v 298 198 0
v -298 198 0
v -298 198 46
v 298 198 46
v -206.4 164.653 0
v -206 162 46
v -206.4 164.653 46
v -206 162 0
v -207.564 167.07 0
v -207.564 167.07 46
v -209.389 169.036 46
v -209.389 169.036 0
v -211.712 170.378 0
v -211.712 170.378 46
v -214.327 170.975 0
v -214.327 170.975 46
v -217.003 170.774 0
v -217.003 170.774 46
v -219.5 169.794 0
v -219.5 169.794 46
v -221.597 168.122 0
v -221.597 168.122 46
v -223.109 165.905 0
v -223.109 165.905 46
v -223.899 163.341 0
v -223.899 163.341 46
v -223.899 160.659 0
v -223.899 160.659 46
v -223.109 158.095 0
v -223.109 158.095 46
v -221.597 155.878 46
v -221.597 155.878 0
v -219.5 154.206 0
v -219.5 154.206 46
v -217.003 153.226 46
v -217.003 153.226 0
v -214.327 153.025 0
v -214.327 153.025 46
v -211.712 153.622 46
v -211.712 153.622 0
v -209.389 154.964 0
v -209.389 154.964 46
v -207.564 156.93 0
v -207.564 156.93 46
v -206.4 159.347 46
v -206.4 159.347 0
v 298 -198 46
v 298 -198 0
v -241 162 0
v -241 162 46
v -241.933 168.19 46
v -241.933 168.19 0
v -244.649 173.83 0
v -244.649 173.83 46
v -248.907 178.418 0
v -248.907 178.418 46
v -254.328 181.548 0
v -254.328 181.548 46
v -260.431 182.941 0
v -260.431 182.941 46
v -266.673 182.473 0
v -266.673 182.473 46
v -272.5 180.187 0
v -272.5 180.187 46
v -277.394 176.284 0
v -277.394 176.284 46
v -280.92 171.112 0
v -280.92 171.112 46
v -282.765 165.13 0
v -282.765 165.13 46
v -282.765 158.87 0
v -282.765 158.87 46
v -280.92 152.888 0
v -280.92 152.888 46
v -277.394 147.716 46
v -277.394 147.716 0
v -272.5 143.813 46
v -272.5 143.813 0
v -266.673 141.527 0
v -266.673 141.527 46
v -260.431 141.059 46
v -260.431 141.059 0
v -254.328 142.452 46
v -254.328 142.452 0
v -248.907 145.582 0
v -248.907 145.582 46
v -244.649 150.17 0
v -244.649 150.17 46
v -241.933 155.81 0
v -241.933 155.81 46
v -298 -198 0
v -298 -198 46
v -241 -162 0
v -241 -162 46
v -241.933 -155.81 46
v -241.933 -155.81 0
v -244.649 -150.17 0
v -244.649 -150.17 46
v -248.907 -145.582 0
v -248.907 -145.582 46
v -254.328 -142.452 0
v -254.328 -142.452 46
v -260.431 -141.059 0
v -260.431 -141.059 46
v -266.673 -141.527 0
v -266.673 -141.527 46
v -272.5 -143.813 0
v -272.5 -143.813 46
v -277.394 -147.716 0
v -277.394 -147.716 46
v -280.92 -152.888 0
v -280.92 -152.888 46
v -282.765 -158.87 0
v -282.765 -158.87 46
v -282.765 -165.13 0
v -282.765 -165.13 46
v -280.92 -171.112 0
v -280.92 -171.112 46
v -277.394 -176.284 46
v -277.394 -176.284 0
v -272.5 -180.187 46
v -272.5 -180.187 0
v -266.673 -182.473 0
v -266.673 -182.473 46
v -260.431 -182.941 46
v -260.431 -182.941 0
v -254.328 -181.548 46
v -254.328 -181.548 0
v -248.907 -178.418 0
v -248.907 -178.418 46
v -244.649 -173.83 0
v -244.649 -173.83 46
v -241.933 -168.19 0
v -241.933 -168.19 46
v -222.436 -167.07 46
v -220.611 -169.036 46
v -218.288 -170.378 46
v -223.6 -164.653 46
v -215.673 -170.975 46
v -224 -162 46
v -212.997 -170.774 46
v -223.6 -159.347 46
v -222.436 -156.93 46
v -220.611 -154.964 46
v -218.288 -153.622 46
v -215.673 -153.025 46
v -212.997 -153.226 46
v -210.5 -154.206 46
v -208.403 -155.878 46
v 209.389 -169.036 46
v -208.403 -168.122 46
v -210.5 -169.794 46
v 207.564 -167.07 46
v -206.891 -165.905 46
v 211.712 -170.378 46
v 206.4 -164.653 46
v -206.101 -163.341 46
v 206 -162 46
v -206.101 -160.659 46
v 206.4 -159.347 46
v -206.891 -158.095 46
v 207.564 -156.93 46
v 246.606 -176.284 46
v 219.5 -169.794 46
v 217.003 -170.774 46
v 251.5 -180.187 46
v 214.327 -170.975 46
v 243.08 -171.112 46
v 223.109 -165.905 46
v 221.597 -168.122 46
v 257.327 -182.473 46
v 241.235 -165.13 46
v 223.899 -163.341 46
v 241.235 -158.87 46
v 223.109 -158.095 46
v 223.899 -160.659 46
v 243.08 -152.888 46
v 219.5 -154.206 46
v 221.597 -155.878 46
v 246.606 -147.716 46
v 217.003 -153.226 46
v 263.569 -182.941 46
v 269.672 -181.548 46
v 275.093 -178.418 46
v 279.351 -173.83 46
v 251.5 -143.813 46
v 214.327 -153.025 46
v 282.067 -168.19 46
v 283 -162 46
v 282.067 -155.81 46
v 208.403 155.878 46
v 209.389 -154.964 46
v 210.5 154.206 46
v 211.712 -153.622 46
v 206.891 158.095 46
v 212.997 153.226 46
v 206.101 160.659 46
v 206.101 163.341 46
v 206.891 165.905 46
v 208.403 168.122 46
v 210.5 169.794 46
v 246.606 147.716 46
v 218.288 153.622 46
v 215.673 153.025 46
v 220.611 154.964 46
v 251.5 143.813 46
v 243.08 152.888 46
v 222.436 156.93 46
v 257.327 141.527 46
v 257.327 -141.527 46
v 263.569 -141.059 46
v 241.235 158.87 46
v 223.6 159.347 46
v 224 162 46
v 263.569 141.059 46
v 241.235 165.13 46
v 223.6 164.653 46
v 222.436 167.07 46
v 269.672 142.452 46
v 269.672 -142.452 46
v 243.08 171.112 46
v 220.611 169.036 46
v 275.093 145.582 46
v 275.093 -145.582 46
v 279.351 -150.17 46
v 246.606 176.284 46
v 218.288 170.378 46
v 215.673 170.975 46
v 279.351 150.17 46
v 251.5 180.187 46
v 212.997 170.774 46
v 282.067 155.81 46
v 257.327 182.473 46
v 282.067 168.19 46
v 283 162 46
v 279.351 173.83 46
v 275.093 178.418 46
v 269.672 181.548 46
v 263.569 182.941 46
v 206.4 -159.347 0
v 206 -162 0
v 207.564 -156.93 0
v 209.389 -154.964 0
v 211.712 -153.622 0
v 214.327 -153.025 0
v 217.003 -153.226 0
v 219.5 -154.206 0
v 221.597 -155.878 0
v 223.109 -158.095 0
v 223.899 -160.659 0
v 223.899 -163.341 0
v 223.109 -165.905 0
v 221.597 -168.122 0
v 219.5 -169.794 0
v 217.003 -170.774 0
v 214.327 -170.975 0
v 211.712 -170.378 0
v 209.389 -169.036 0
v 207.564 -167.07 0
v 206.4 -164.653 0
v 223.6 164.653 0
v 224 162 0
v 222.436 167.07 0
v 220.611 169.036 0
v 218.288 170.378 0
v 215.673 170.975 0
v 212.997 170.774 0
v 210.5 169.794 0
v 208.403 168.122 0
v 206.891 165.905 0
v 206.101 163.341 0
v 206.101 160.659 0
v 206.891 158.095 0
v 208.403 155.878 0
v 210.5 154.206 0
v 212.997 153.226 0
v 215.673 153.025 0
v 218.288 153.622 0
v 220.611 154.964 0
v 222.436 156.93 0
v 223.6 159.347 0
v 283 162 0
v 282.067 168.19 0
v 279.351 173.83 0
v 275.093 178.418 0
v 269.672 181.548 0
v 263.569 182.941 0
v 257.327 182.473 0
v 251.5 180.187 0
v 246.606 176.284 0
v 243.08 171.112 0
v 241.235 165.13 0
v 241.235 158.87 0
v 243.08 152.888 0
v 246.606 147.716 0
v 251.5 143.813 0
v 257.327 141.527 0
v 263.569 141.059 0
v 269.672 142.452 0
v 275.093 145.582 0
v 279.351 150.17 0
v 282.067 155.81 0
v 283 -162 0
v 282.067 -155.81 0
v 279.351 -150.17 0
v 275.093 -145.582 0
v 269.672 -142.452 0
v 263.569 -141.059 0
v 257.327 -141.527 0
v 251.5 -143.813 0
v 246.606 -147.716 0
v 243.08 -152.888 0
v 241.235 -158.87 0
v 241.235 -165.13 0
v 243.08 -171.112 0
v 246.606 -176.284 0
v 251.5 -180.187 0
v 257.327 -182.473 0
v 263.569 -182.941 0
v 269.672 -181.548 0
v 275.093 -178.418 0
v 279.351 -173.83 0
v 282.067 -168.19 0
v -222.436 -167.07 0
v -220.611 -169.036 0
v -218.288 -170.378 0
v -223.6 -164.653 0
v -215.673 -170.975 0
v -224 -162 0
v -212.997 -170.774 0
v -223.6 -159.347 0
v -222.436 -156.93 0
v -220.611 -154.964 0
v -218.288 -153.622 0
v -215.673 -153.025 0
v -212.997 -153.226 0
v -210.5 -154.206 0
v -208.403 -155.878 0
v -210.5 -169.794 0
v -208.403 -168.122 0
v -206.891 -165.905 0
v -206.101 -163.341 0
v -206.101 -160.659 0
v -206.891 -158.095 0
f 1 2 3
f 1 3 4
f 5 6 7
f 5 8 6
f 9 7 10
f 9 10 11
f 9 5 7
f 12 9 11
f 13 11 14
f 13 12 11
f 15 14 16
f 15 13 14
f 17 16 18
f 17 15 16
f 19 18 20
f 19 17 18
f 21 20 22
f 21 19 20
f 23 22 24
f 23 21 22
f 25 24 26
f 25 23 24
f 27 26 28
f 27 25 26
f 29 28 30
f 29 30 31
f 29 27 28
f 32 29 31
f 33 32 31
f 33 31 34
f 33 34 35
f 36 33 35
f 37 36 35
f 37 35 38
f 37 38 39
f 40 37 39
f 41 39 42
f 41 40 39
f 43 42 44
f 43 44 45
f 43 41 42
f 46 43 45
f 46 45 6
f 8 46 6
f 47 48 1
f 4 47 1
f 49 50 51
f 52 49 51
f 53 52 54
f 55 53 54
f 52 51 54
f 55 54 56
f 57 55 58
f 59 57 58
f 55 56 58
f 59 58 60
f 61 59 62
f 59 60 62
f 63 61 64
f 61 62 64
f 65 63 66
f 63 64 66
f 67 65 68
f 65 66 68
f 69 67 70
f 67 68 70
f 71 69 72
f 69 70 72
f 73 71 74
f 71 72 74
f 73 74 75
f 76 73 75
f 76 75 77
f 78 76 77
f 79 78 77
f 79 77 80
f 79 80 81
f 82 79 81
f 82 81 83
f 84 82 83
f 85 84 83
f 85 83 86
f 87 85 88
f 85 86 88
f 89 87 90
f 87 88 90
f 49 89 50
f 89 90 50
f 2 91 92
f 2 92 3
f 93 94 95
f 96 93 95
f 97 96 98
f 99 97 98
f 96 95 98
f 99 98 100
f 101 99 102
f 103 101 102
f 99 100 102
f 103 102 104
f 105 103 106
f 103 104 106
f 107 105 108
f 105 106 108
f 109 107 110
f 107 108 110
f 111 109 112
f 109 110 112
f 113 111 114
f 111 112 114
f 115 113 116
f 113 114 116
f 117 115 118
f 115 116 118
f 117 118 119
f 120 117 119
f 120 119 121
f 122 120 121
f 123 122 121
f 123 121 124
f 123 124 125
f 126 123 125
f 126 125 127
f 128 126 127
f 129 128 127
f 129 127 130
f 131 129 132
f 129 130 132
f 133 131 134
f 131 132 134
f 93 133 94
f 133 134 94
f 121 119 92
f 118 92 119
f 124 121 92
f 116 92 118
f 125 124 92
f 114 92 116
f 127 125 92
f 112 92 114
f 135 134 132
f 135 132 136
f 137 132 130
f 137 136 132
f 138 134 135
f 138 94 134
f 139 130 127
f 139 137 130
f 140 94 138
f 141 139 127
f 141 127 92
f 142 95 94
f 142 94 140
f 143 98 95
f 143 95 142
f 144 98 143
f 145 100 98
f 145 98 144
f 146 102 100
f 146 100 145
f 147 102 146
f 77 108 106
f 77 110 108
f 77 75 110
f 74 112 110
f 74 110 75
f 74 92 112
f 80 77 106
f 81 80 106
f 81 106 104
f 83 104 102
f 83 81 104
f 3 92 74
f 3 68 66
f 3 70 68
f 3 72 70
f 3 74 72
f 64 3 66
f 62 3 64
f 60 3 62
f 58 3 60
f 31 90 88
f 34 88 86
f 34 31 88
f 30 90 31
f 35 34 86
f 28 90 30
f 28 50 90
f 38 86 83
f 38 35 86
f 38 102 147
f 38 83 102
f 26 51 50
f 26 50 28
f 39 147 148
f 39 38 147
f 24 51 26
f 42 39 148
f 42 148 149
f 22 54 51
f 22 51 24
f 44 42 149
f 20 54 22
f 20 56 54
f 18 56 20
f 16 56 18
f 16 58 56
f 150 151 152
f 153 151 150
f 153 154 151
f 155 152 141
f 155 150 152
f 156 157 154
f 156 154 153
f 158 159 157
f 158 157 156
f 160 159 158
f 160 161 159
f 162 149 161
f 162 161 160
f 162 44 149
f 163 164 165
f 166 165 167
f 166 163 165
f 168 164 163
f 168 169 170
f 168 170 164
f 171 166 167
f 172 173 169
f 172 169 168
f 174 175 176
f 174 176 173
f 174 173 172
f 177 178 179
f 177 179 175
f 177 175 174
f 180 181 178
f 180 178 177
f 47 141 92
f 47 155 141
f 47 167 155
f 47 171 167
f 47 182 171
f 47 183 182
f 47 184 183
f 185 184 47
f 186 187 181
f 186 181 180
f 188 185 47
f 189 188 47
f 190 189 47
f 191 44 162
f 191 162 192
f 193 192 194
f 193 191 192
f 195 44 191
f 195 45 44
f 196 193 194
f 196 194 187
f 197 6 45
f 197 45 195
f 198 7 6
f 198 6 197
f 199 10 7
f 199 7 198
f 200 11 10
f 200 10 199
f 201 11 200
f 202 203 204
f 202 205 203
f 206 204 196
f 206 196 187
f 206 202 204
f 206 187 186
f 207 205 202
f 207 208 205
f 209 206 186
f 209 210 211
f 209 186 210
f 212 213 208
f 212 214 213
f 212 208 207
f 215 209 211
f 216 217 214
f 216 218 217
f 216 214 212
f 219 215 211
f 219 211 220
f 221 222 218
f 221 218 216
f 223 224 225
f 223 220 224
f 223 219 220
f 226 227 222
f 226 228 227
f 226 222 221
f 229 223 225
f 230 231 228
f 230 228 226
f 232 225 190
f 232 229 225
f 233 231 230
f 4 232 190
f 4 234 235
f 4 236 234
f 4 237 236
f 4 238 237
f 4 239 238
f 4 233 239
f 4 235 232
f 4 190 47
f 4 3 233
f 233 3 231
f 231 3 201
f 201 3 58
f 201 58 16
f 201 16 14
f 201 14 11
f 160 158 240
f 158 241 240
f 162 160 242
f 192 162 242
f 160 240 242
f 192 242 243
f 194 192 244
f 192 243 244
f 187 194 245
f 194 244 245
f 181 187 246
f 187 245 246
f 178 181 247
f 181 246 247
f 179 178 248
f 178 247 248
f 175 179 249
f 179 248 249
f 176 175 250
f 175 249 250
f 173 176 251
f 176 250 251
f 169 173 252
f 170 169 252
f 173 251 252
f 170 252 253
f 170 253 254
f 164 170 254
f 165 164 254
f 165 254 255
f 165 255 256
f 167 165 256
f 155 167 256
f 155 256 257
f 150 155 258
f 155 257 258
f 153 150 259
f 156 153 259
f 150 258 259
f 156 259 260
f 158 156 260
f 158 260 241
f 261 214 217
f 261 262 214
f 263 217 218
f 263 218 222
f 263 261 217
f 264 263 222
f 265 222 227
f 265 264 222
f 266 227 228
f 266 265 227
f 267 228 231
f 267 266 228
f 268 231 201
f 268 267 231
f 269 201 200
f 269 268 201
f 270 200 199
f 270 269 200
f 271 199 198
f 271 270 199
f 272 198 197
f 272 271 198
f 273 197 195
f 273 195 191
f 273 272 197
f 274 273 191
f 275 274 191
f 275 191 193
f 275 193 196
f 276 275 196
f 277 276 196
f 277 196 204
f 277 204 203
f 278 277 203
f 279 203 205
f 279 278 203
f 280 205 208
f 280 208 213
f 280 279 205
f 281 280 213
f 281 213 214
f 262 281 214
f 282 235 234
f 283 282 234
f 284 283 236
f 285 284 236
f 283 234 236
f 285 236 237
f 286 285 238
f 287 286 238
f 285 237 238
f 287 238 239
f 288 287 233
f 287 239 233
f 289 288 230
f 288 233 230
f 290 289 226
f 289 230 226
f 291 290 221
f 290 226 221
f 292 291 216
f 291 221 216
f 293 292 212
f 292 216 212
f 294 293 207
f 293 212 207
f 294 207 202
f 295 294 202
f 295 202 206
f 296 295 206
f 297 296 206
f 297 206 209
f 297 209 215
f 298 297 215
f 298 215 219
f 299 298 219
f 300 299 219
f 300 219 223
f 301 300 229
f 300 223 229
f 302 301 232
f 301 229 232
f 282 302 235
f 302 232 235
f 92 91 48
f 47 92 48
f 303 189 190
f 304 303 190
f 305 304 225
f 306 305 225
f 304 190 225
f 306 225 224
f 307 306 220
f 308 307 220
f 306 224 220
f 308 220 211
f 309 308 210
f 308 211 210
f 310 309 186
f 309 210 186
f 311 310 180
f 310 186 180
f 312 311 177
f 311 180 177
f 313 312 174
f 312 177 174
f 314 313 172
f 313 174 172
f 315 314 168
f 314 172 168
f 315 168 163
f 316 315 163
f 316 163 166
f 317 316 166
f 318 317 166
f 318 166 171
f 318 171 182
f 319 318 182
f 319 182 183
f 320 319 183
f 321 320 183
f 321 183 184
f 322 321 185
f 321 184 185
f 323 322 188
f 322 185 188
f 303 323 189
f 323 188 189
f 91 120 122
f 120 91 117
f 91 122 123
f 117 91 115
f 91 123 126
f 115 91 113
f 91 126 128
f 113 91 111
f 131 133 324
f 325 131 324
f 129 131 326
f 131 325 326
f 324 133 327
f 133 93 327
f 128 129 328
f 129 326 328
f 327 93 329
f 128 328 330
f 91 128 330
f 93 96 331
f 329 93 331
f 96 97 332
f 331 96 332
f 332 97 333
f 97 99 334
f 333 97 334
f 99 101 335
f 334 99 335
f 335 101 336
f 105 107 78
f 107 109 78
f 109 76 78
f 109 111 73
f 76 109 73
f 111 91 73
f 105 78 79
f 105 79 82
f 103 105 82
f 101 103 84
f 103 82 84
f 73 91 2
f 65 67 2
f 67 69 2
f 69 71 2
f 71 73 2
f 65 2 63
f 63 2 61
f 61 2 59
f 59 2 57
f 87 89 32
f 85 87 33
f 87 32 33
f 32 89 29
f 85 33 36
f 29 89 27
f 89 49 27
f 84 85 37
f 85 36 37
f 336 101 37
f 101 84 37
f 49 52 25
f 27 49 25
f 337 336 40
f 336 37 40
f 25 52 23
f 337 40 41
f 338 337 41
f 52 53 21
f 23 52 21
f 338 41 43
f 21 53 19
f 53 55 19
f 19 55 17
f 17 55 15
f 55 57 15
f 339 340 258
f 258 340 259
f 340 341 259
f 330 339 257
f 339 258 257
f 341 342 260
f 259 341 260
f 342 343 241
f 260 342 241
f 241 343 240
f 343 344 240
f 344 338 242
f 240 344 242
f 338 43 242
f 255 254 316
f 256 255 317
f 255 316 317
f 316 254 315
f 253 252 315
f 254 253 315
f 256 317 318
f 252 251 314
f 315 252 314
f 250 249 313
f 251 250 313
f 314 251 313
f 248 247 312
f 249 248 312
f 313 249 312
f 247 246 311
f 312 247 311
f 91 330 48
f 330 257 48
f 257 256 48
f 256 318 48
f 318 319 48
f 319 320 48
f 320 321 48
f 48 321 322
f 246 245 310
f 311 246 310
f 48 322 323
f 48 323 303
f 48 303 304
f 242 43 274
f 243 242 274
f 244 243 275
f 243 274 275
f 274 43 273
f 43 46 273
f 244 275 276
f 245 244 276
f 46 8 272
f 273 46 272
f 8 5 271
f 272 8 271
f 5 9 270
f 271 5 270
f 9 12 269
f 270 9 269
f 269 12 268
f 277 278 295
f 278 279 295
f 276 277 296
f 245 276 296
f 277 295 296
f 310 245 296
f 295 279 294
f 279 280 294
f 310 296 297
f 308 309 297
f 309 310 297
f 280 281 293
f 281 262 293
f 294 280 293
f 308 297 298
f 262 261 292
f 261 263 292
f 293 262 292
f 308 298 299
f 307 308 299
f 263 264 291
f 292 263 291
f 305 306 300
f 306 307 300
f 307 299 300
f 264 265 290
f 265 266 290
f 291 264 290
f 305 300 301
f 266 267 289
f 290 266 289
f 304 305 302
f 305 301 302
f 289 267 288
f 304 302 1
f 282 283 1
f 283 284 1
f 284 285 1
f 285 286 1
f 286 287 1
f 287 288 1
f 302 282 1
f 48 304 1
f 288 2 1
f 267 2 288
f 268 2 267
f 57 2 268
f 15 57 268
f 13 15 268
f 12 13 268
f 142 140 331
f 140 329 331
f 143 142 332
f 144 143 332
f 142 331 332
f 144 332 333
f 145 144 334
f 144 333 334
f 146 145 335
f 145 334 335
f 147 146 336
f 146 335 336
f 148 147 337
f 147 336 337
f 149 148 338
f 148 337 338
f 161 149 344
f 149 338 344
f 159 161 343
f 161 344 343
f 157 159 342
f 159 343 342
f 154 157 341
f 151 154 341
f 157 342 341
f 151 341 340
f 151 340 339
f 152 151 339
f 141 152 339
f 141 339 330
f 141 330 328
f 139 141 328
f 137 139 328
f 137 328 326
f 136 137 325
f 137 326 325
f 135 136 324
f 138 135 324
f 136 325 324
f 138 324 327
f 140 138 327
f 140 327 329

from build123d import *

# Parameters (mm, degrees)
SZKIC1_W                    = 596
SZKIC1_H                    = 396
DODANIE_WYCI_GNI_CIE1_DEPTH = 46
SZKIC2_R                    = 21
WYTNIJ_WYCI_GNI_CIE1_DEPTH  = 46
SZKIC3_R                    = 21
WYTNIJ_WYCI_GNI_CIE2_DEPTH  = 46
SZKIC4_R                    = 21
WYTNIJ_WYCI_GNI_CIE3_DEPTH  = 46
SZKIC5_R                    = 21
WYTNIJ_WYCI_GNI_CIE4_DEPTH  = 46
SZKIC6_W                    = 46
SZKIC6_H                    = 9
SZKIC7_W                    = 46
SZKIC7_H                    = 9
SZKIC8_W                    = 46
SZKIC8_H                    = 9
SZKIC9_W                    = 46
SZKIC9_H                    = 9


with BuildPart() as part:
    # Szkic1 → Dodanie-wyciągnięcie1 (new body)
    with BuildSketch(Plane.XY):
        Rectangle(SZKIC1_W, SZKIC1_H)
    extrude(amount=DODANIE_WYCI_GNI_CIE1_DEPTH)

    # Szkic2 → Wytnij-wyciągnięcie1 (cut)
    with BuildSketch(Plane.XY.offset(46)):
        with Locations((262, 162)):
            Circle(SZKIC2_R)
    extrude(amount=-WYTNIJ_WYCI_GNI_CIE1_DEPTH, mode=Mode.SUBTRACT)

    # Szkic3 → Wytnij-wyciągnięcie2 (cut)
    with BuildSketch(Plane.XY.offset(46)):
        with Locations((262, -162)):
            Circle(SZKIC3_R)
    extrude(amount=-WYTNIJ_WYCI_GNI_CIE2_DEPTH, mode=Mode.SUBTRACT)

    # Szkic4 → Wytnij-wyciągnięcie3 (cut)
    with BuildSketch(Plane.XY.offset(46)):
        with Locations((-262, -162)):
            Circle(SZKIC4_R)
    extrude(amount=-WYTNIJ_WYCI_GNI_CIE3_DEPTH, mode=Mode.SUBTRACT)

    # Szkic5 → Wytnij-wyciągnięcie4 (cut)
    with BuildSketch(Plane.XY.offset(46)):
        with Locations((-262, 162)):
            Circle(SZKIC5_R)
    extrude(amount=-WYTNIJ_WYCI_GNI_CIE4_DEPTH, mode=Mode.SUBTRACT)

    # Szkic6 → Wycięcie-obrót1 (revolve, cut)
    with BuildSketch(Plane(origin=(215, 0, 0), x_dir=(0, 0, -1), z_dir=(1, 0, 0))):
        with Locations((-23, 166.5)):
            Rectangle(SZKIC6_W, SZKIC6_H)
    revolve(axis=Axis((215, 162, 0), (0, 0, 1)), mode=Mode.SUBTRACT)

    # Szkic7 → Wycięcie-obrót2 (revolve, cut)
    with BuildSketch(Plane(origin=(215, 0, 0), x_dir=(0, 0, -1), z_dir=(1, 0, 0))):
        with Locations((-23, -166.5)):
            Rectangle(SZKIC7_W, SZKIC7_H)
    revolve(axis=Axis((215, -162, 46), (0, 0, -1)), mode=Mode.SUBTRACT)

    # Szkic8 → Wycięcie-obrót3 (revolve, cut)
    with BuildSketch(Plane(origin=(-215, 0, 0), x_dir=(0, 0, -1), z_dir=(1, 0, 0))):
        with Locations((-23, 166.5)):
            Rectangle(SZKIC8_W, SZKIC8_H)
    revolve(axis=Axis((-215, 162, 0), (0, 0, 1)), mode=Mode.SUBTRACT)

    # Szkic9 → Wycięcie-obrót4 (revolve, cut)
    with BuildSketch(Plane(origin=(-215, 0, 0), x_dir=(0, 0, -1), z_dir=(1, 0, 0))):
        with Locations((-23, -166.5)):
            Rectangle(SZKIC9_W, SZKIC9_H)
    revolve(axis=Axis((-215, -162, 46), (0, 0, -1)), mode=Mode.SUBTRACT)


solid = part.part
